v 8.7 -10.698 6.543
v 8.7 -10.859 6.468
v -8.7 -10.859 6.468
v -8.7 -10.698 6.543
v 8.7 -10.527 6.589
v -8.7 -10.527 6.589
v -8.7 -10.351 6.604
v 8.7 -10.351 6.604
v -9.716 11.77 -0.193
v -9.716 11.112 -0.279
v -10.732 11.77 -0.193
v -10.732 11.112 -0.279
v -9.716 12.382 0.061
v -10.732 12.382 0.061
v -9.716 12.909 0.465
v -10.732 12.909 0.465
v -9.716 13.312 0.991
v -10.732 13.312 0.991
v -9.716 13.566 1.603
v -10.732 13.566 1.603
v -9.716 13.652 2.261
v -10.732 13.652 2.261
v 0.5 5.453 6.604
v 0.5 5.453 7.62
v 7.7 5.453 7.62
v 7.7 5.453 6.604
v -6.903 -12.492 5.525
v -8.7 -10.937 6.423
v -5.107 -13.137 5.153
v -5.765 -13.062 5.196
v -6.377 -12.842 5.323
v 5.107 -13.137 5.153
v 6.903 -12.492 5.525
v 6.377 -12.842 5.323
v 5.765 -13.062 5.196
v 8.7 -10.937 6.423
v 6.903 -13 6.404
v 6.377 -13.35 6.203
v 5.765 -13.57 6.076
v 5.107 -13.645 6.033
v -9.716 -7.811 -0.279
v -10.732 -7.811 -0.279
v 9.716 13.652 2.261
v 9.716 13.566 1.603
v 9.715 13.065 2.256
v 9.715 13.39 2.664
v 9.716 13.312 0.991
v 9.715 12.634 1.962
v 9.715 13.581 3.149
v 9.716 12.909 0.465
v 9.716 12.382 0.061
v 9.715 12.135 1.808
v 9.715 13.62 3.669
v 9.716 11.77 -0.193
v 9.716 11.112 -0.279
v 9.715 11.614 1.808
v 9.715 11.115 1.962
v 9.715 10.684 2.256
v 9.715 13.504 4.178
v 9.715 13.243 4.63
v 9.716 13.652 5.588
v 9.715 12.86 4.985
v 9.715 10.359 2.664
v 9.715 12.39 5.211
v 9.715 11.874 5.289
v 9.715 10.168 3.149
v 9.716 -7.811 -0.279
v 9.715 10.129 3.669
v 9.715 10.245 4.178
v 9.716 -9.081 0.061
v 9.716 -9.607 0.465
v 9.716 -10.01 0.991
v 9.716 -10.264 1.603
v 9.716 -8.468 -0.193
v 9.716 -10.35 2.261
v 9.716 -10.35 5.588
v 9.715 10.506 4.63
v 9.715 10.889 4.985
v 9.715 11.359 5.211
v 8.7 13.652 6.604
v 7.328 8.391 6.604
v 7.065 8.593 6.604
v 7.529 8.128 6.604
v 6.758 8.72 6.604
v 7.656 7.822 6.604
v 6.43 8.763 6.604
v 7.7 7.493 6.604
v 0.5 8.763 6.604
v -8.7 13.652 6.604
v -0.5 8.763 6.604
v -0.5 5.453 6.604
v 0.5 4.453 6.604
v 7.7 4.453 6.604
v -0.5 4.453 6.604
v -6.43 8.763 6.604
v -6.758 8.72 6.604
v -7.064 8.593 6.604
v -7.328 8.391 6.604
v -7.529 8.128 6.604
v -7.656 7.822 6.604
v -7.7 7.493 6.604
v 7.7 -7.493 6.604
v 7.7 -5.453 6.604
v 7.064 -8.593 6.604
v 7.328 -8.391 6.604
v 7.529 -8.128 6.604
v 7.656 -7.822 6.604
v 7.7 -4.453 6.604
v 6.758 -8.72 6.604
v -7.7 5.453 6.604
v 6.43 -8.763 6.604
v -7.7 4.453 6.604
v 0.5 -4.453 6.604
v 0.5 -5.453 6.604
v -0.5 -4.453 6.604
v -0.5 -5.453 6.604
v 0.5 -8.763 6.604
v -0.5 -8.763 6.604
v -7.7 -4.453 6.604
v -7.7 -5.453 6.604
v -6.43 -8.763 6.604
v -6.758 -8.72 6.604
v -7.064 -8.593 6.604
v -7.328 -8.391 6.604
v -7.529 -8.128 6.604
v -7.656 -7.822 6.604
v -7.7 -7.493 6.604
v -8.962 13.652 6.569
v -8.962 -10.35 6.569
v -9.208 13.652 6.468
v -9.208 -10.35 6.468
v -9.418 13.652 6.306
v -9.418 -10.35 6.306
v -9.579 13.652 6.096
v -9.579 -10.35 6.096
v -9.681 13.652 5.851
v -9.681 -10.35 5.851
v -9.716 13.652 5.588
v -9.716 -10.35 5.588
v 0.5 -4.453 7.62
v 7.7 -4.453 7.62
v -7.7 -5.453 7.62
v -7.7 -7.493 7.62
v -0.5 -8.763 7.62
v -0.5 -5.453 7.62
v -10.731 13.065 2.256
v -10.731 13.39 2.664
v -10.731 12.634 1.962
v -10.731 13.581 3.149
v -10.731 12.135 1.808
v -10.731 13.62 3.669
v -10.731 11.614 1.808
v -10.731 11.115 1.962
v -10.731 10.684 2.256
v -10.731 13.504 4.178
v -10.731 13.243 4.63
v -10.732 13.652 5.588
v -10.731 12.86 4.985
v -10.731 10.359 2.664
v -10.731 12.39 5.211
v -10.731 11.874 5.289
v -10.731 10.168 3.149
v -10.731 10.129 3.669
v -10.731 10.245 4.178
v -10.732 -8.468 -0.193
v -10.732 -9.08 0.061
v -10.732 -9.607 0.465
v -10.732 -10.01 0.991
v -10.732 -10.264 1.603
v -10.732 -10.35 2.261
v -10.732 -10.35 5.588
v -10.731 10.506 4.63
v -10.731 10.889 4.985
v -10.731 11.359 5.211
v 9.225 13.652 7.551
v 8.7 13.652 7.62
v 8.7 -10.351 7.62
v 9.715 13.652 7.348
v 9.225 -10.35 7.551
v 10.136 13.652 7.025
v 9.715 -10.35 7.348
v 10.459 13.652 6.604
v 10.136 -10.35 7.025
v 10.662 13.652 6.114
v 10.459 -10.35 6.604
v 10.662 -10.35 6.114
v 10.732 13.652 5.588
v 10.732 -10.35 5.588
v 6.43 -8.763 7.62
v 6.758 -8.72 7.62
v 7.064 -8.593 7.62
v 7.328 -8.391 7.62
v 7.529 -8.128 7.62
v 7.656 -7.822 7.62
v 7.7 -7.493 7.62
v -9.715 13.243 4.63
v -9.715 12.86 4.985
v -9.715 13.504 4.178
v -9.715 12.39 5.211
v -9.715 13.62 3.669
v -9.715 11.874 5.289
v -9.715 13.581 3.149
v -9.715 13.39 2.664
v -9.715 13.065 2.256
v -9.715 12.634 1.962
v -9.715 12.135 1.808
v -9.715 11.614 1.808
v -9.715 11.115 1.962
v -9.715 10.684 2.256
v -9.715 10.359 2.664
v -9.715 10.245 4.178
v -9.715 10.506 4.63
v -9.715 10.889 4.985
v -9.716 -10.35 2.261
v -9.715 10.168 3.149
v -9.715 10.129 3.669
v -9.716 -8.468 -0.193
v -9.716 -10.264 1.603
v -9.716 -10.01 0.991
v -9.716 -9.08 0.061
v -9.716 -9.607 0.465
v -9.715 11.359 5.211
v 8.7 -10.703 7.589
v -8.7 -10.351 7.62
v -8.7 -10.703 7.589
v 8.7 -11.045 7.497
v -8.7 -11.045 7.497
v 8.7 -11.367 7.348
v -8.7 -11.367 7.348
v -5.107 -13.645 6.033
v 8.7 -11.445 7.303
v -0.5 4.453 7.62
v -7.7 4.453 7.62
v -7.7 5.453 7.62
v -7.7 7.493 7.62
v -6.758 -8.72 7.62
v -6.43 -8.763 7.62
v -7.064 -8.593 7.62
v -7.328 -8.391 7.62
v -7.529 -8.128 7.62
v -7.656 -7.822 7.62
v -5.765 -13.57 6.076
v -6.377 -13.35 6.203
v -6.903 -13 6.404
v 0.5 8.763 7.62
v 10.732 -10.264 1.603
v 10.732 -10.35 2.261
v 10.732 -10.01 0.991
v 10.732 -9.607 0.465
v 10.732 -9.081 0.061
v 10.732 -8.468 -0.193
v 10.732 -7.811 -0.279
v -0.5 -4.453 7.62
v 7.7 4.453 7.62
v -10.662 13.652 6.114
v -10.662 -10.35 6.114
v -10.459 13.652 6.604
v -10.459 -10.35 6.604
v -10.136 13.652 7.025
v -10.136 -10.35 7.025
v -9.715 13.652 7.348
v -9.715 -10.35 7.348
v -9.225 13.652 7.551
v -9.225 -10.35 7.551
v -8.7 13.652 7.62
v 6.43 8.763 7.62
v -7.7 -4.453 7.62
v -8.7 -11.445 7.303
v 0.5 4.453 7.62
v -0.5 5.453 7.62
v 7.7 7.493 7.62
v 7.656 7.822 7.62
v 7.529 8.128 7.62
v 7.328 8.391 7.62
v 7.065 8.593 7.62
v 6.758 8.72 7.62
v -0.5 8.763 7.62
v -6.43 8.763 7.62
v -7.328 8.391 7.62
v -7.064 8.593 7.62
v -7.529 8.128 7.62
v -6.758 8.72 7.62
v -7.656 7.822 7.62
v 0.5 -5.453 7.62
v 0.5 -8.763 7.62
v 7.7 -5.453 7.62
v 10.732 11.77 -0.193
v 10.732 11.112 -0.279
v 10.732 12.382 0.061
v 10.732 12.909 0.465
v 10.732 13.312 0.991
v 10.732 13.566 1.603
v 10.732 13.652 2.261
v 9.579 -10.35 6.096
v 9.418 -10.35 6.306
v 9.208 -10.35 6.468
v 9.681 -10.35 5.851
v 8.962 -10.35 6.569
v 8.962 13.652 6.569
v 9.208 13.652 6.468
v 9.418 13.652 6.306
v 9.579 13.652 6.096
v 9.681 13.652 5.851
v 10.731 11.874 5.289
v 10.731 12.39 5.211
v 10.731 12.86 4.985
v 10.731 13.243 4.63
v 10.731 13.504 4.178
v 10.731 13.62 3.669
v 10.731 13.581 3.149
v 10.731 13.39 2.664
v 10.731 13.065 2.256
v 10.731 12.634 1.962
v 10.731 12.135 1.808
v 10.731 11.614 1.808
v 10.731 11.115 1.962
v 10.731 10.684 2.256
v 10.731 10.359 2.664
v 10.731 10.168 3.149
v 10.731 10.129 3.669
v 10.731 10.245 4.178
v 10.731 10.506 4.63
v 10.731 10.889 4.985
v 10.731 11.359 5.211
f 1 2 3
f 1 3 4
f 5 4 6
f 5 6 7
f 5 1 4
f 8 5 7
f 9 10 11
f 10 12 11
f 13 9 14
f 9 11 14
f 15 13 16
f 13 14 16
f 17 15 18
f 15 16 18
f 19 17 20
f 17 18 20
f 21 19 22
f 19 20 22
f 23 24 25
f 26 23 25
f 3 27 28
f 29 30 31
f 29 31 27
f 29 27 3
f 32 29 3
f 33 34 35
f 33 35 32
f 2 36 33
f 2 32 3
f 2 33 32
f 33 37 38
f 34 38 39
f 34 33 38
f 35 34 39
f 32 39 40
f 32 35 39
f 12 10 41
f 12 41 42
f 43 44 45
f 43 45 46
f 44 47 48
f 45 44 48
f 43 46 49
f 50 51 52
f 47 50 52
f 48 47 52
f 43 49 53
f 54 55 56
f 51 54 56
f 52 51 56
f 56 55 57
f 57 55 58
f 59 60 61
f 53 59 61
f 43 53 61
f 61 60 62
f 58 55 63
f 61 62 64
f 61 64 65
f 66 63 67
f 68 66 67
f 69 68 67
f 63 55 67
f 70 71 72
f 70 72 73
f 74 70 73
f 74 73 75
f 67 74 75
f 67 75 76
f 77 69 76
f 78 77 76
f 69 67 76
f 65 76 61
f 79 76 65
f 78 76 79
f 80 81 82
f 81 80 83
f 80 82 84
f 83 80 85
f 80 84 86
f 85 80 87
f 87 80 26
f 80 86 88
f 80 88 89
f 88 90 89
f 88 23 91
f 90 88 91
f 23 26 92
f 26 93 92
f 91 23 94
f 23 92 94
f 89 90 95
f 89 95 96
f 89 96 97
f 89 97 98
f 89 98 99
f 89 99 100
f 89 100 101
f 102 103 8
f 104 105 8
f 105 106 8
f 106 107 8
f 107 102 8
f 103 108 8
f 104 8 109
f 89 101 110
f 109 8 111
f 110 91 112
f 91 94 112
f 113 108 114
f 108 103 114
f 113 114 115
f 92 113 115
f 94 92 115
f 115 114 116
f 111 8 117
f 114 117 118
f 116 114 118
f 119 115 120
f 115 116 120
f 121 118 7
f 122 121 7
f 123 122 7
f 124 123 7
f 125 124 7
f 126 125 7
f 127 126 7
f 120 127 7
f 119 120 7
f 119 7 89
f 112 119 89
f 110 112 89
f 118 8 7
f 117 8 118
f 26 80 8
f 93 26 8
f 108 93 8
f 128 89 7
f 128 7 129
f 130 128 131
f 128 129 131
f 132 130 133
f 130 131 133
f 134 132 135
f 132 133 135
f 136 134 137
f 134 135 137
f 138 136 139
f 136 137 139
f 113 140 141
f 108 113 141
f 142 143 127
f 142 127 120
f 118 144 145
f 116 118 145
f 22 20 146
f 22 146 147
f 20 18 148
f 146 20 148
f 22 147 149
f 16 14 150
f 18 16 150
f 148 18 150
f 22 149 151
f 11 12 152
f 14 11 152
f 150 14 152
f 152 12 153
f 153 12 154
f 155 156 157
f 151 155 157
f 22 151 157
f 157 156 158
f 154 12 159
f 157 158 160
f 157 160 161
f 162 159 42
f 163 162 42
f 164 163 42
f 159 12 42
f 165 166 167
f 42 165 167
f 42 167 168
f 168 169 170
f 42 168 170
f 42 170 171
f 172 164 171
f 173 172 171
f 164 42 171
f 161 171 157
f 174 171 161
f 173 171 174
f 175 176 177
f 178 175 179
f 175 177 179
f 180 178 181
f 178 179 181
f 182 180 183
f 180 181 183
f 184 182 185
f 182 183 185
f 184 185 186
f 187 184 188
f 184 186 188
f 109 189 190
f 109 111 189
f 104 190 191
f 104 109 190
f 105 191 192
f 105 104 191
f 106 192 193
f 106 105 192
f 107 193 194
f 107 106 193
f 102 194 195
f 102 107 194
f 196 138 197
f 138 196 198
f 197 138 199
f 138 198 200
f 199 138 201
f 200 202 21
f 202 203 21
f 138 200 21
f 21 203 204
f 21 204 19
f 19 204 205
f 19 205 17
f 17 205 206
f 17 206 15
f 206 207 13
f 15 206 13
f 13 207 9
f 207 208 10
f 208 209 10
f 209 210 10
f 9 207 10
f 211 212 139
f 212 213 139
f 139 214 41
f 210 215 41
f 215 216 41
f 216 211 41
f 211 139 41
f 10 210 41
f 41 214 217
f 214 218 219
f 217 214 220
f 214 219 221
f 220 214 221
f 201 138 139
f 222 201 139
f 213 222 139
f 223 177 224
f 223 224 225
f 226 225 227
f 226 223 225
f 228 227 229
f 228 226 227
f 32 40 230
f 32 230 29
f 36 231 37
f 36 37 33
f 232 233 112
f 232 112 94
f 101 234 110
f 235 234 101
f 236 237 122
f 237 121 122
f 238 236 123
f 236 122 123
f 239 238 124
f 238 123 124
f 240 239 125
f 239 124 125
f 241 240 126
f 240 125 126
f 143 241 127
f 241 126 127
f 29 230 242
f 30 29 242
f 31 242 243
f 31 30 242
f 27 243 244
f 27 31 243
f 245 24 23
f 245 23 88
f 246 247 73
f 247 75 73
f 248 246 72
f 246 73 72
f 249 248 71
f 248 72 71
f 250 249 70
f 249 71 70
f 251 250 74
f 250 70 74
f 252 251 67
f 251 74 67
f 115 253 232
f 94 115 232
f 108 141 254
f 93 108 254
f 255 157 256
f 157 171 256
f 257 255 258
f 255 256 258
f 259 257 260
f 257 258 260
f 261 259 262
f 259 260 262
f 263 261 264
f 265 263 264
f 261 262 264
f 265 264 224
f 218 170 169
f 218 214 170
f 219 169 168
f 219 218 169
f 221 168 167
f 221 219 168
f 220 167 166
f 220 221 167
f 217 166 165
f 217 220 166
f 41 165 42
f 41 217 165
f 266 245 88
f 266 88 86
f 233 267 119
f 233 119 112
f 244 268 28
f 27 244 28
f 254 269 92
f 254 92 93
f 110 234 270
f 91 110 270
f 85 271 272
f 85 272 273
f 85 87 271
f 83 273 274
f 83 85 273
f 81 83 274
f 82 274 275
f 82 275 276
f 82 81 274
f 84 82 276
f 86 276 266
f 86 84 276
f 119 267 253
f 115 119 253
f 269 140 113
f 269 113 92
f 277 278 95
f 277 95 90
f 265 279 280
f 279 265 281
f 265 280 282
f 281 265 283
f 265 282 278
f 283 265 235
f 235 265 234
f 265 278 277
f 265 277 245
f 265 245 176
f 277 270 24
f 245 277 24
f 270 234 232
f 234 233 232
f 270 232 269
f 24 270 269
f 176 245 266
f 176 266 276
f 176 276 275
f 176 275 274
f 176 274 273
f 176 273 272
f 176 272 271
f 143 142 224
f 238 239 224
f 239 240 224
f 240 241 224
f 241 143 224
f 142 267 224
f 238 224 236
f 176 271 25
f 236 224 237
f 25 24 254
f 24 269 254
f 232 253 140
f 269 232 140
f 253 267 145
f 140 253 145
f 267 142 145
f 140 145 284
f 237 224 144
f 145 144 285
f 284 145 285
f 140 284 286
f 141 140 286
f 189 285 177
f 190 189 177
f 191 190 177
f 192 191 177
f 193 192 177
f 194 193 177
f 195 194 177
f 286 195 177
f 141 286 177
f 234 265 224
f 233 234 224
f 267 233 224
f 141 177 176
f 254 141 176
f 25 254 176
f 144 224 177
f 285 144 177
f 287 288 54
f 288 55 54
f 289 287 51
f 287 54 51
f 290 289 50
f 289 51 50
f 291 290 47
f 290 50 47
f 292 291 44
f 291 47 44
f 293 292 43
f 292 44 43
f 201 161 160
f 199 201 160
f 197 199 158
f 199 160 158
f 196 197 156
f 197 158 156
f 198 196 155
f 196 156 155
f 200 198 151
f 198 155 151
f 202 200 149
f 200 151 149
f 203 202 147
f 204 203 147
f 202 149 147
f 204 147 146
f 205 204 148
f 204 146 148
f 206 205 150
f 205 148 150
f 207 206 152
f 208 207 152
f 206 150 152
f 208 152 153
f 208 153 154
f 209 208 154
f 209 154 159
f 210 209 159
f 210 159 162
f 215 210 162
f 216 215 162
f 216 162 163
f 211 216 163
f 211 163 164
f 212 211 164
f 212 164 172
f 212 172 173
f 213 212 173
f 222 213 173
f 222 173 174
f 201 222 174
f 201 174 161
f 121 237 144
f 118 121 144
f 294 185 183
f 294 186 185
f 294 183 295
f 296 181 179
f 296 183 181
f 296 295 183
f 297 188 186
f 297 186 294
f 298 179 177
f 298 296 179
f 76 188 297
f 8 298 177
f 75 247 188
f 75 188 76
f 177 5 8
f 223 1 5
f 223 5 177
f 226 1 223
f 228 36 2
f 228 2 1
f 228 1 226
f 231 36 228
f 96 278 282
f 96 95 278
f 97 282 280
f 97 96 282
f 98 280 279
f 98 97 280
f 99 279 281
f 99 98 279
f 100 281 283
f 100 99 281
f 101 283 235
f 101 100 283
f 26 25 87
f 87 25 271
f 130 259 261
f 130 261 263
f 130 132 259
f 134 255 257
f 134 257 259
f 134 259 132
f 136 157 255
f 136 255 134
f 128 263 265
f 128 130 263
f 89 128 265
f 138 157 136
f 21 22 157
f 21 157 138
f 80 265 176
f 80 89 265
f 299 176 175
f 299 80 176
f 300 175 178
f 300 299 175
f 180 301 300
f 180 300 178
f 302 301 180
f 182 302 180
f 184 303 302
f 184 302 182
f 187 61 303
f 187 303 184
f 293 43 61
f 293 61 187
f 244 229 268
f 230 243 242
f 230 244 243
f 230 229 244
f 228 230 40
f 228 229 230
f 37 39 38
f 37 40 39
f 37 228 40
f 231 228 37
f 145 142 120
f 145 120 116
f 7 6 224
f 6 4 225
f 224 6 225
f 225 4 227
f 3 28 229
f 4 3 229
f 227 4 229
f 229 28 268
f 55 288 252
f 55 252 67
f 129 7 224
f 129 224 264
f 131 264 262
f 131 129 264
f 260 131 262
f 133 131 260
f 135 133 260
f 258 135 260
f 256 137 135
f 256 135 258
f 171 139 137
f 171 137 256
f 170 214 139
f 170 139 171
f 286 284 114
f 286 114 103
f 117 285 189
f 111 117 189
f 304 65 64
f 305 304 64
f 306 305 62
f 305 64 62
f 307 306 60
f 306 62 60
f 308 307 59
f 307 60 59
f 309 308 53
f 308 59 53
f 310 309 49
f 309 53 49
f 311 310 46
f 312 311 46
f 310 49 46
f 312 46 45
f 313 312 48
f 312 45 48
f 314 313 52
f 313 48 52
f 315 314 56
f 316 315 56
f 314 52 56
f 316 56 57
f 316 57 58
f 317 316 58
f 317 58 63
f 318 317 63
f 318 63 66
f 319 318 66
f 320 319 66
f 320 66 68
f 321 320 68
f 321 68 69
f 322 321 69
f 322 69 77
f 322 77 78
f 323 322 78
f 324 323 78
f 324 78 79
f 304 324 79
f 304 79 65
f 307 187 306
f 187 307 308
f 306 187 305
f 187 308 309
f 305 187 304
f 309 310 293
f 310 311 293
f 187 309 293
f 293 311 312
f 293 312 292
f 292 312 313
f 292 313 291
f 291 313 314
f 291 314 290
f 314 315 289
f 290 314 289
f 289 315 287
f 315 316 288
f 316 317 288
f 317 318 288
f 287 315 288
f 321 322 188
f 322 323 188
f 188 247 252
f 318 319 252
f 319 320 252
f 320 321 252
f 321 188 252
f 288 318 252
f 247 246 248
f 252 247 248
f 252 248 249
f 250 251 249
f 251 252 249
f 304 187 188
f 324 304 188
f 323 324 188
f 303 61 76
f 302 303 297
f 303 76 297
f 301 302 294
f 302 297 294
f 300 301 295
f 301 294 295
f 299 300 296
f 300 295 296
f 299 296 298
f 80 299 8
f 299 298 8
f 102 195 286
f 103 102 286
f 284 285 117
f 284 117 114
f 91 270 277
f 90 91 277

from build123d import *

# Parameters (mm, degrees)
SKETCH1_W                      = 20.955
SKETCH1_H                      = 20.701
BOSS_EXTRUDE1_DEPTH            = 7.62
FILLET3_R                      = 0.762
SHELL1_T                       = -1.016
SKETCH3_W                      = 18.923
SKETCH3_H                      = 1.016
CUT_EXTRUDE1_DEPTH             = 6.604
CONVERT_SOLID1_START           = -10.4775
CONVERT_SOLID1_OUTLINE_W       = 20.701
CONVERT_SOLID1_OUTLINE_H       = 6.604
CONVERT_SOLID1_DEPTH           = 20.955
CONVERT_SOLID1_2_OUTLINE_W     = 20.701
CONVERT_SOLID1_2_OUTLINE_H     = 1.016
CONVERT_SOLID1_2_DEPTH         = 0.762
CONVERT_SOLID1_START_2         = 9.7155
CONVERT_SOLID1_3_OUTLINE_W     = 20.701
CONVERT_SOLID1_3_OUTLINE_H     = 1.016
CONVERT_SOLID1_3_DEPTH         = 0.762
EDGE_FLANGE1_STRIP_W           = 6.096
EDGE_FLANGE1_STRIP_H           = 1.016
EDGE_FLANGE1_STRIP_CUT_DEPTH   = 20.701
EDGE_FLANGE1_STRIP_2_W         = 6.096
EDGE_FLANGE1_STRIP_2_H         = 1.016
EDGE_FLANGE1_STRIP_CUT_2_DEPTH = 20.701
EDGE_FLANGE1_DEPTH             = 20.701
EDGE_FLANGE1_BEND_DEPTH        = 20.701
EDGE_FLANGE2_DEPTH             = 17.399
CHAMFER1_SIZE                  = 2.54
SKETCH23_W                     = 15.399
SKETCH23_H                     = 17.526
CUT_EXTRUDE2_DEPTH             = 20.071990326
FILLET5_R                      = 1.27
SKETCH24_W                     = 1
SKETCH24_H                     = 17.526
SKETCH24_W_2                   = 15.399
SKETCH24_H_2                   = 1
EXTRUDE_THIN1_DEPTH            = 1.016
BOSS_EXTRUDE2_DEPTH            = 3.302
FILLET4_R                      = 2.54
F_3_5_3_5_DIAMETER_HOLE1_D     = 3.5
FILLET6_R                      = 2.54


with BuildPart() as part:
    # Sketch1 → Boss-Extrude1 (new body)
    with BuildSketch(Plane.XY):
        Rectangle(SKETCH1_W, SKETCH1_H)
    extrude(amount=BOSS_EXTRUDE1_DEPTH)

    # Fillet3
    fillet3_edges = [part.edges().sort_by_distance(p)[0] for p in [
        (10.4775, 0, 7.62),
        (-10.4775, 0, 7.62),
    ]]
    fillet(fillet3_edges, radius=FILLET3_R)

    # Shell1
    shell1_openings = [part.faces().sort_by_distance(p)[0] for p in [
        (0, 0, 0),
    ]]
    offset(amount=SHELL1_T, openings=shell1_openings, kind=Kind.INTERSECTION)

    # Sketch3 → Cut-Extrude1 (cut)
    with BuildSketch(Plane(origin=(0, 0, 0), x_dir=(-1, 0, 0), z_dir=(0, 0, -1))):
        with Locations((0, -9.8425)):
            Rectangle(SKETCH3_W, SKETCH3_H)
    extrude(amount=-CUT_EXTRUDE1_DEPTH, mode=Mode.SUBTRACT)

    # Convert-Solid1: read off the stored shape, not the designer's step
    # Convert-Solid1 outline → Convert-Solid1 (cut)
    with BuildSketch(Plane.YZ.offset(CONVERT_SOLID1_START)):
        with Locations((0, 3.302)):
            Rectangle(CONVERT_SOLID1_OUTLINE_W, CONVERT_SOLID1_OUTLINE_H)
    extrude(amount=CONVERT_SOLID1_DEPTH, mode=Mode.SUBTRACT)

    # Convert-Solid1 2 outline → Convert-Solid1 2 (cut)
    with BuildSketch(Plane.YZ.offset(CONVERT_SOLID1_START)):
        with Locations((0, 7.112)):
            Rectangle(CONVERT_SOLID1_2_OUTLINE_W, CONVERT_SOLID1_2_OUTLINE_H)
    extrude(amount=CONVERT_SOLID1_2_DEPTH, mode=Mode.SUBTRACT)

    # Convert-Solid1 3 outline → Convert-Solid1 3 (cut)
    with BuildSketch(Plane.YZ.offset(CONVERT_SOLID1_START_2)):
        with Locations((0, 7.112)):
            Rectangle(CONVERT_SOLID1_3_OUTLINE_W, CONVERT_SOLID1_3_OUTLINE_H)
    extrude(amount=CONVERT_SOLID1_3_DEPTH, mode=Mode.SUBTRACT)

    # Edge-Flange1: sheet metal written as solids
    # Edge-Flange1 strip (on a plane across the edge) → Edge-Flange1 strip cut (cut)
    with BuildSketch(Plane(origin=(9.7155, 10.3505, 6.604), x_dir=(-1, 0, 0), z_dir=(0, -1, 0))):
        with Locations((-2.032, -0.508)):
            Rectangle(EDGE_FLANGE1_STRIP_W, EDGE_FLANGE1_STRIP_H)
    extrude(amount=EDGE_FLANGE1_STRIP_CUT_DEPTH, mode=Mode.SUBTRACT)

    # Edge-Flange1 strip 2 (on a plane across the edge) → Edge-Flange1 strip cut 2 (cut)
    with BuildSketch(Plane(origin=(-9.7155, -10.3505, 6.604), x_dir=(1, 0, 0), z_dir=(0, 1, 0))):
        with Locations((-2.032, -0.508)):
            Rectangle(EDGE_FLANGE1_STRIP_2_W, EDGE_FLANGE1_STRIP_2_H)
    extrude(amount=EDGE_FLANGE1_STRIP_CUT_2_DEPTH, mode=Mode.SUBTRACT)

    # Edge-Flange1 section (on a plane across the edge) → Edge-Flange1 (add)
    with BuildSketch(Plane(origin=(9.7155, 10.3505, 6.604), x_dir=(-1, 0, 0), z_dir=(0, -1, 0))):
        with BuildLine():
            Line((-1.016, 1.016), (-1.016, 6.8834))
            Line((-1.016, 6.8834), (0, 6.8834))
            Line((0, 6.8834), (0, 1.016))
            ThreePointArc((0, 1.016), (0.29757951, 0.29757951), (1.016, 0))
            Line((1.016, 0), (1.016, -1.016))
            ThreePointArc((1.016, -1.016), (-0.420840979, -0.420840979), (-1.016, 1.016))
        make_face()
    extrude(amount=EDGE_FLANGE1_DEPTH)

    # Edge-Flange1 section 2 (on a plane across the edge) → Edge-Flange1 bend (add)
    with BuildSketch(Plane(origin=(-9.7155, -10.3505, 6.604), x_dir=(1, 0, 0), z_dir=(0, 1, 0))):
        with BuildLine():
            Line((-1.016, 1.016), (-1.016, 6.8834))
            Line((-1.016, 6.8834), (0, 6.8834))
            Line((0, 6.8834), (0, 1.016))
            ThreePointArc((0, 1.016), (0.29757951, 0.29757951), (1.016, 0))
            Line((1.016, 0), (1.016, -1.016))
            ThreePointArc((1.016, -1.016), (-0.420840979, -0.420840979), (-1.016, 1.016))
        make_face()
    extrude(amount=EDGE_FLANGE1_BEND_DEPTH)

    # Edge-Flange2: sheet metal written as solids
    # Edge-Flange2 section (on a plane across the edge) → Edge-Flange2 (add)
    with BuildSketch(Plane(origin=(8.6995, -10.62273638, 6.604), x_dir=(0, 0.49999999999999495, -0.8660254037844416), z_dir=(-1, 0, 0))):
        with BuildLine():
            Line((-1.016, 0.27223638), (-1.016, 2.90276362))
            Line((-1.016, 2.90276362), (0, 2.90276362))
            Line((0, 2.90276362), (0, 0.27223638))
            ThreePointArc((0, 0.27223638), (0.03461936, 0.00927623), (0.13611819, -0.23576362))
            Line((0.13611819, -0.23576362), (-0.74376362, -0.74376362))
            ThreePointArc((-0.74376362, -0.74376362), (-0.946761279, -0.25368392), (-1.016, 0.27223638))
        make_face()
    extrude(amount=EDGE_FLANGE2_DEPTH)

    # Chamfer1
    chamfer1_edges = [part.edges().sort_by_distance(p)[0] for p in [
        (8.6995, -13.390603416, 5.592559095),
        (-8.6995, -13.390603416, 5.592559095),
    ]]
    chamfer(chamfer1_edges, length=CHAMFER1_SIZE)

    # Sketch23 → Cut-Extrude2 (cut, through all)
    with BuildSketch(Plane.XY.offset(7.62)):
        Rectangle(SKETCH23_W, SKETCH23_H)
    extrude(amount=-CUT_EXTRUDE2_DEPTH, mode=Mode.SUBTRACT)

    # Fillet5
    fillet5_edges = [part.edges().sort_by_distance(p)[0] for p in [
        (-7.6995, 8.763, 7.112),
        (7.6995, 8.763, 7.112),
        (7.6995, -8.763, 7.112),
        (-7.6995, -8.763, 7.112),
    ]]
    fillet(fillet5_edges, radius=FILLET5_R)

    # Sketch24 → Extrude-Thin1 (add)
    with BuildSketch(Plane.XY.offset(7.62)):
        Rectangle(SKETCH24_W, SKETCH24_H)
        with Locations((0, -4.953)):
            Rectangle(SKETCH24_W_2, SKETCH24_H_2)
        with Locations((0, 4.953)):
            Rectangle(SKETCH24_W_2, SKETCH24_H_2)
    extrude(amount=-EXTRUDE_THIN1_DEPTH)

    # Sketch25 → Boss-Extrude2 (add)
    with BuildSketch(Plane(origin=(0, 10.3505, 0), x_dir=(1, 0, 0), z_dir=(0, 1, 0))):
        with BuildLine():
            Line((10.7315, -5.588), (10.7315, 0.2794))
            Line((10.7315, 0.2794), (9.7155, 0.2794))
            Line((9.7155, 0.2794), (9.7155, -5.588))
            ThreePointArc((9.7155, -5.588), (9.41792049, -6.30642049), (8.6995, -6.604))
            Line((8.6995, -6.604), (-8.6995, -6.604))
            ThreePointArc((-8.6995, -6.604), (-9.41792049, -6.30642049), (-9.7155, -5.588))
            Line((-9.7155, -5.588), (-9.7155, 0.2794))
            Line((-9.7155, 0.2794), (-10.7315, 0.2794))
            Line((-10.7315, 0.2794), (-10.7315, -5.588))
            ThreePointArc((-10.7315, -5.588), (-10.136340979, -7.024840979), (-8.6995, -7.62))
            Line((-8.6995, -7.62), (8.6995, -7.62))
            ThreePointArc((8.6995, -7.62), (10.136340979, -7.024840979), (10.7315, -5.588))
        make_face()
    extrude(amount=BOSS_EXTRUDE2_DEPTH)

    # Fillet4
    fillet4_edges = [part.edges().sort_by_distance(p)[0] for p in [
        (10.2235, 13.6525, -0.2794),
        (-10.2235, 13.6525, -0.2794),
        (10.2235, -10.3505, -0.2794),
        (-10.2235, -10.3505, -0.2794),
    ]]
    fillet(fillet4_edges, radius=FILLET4_R)

    # Ø3.5 (3.5) Diameter Hole1 (through all)
    with Locations(Plane(origin=(10.7315, 0, 0), x_dir=(0, 0, -1), z_dir=(1, 0, 0))):
        with Locations((-3.5386, 11.8745)):
            Hole(F_3_5_3_5_DIAMETER_HOLE1_D / 2)

    # Fillet6
    fillet6_edges = [part.edges().sort_by_distance(p)[0] for p in [
        (-6.1595, -13.390603416, 5.592559095),
        (6.1595, -13.390603416, 5.592559095),
    ]]
    fillet(fillet6_edges, radius=FILLET6_R)


solid = part.part
